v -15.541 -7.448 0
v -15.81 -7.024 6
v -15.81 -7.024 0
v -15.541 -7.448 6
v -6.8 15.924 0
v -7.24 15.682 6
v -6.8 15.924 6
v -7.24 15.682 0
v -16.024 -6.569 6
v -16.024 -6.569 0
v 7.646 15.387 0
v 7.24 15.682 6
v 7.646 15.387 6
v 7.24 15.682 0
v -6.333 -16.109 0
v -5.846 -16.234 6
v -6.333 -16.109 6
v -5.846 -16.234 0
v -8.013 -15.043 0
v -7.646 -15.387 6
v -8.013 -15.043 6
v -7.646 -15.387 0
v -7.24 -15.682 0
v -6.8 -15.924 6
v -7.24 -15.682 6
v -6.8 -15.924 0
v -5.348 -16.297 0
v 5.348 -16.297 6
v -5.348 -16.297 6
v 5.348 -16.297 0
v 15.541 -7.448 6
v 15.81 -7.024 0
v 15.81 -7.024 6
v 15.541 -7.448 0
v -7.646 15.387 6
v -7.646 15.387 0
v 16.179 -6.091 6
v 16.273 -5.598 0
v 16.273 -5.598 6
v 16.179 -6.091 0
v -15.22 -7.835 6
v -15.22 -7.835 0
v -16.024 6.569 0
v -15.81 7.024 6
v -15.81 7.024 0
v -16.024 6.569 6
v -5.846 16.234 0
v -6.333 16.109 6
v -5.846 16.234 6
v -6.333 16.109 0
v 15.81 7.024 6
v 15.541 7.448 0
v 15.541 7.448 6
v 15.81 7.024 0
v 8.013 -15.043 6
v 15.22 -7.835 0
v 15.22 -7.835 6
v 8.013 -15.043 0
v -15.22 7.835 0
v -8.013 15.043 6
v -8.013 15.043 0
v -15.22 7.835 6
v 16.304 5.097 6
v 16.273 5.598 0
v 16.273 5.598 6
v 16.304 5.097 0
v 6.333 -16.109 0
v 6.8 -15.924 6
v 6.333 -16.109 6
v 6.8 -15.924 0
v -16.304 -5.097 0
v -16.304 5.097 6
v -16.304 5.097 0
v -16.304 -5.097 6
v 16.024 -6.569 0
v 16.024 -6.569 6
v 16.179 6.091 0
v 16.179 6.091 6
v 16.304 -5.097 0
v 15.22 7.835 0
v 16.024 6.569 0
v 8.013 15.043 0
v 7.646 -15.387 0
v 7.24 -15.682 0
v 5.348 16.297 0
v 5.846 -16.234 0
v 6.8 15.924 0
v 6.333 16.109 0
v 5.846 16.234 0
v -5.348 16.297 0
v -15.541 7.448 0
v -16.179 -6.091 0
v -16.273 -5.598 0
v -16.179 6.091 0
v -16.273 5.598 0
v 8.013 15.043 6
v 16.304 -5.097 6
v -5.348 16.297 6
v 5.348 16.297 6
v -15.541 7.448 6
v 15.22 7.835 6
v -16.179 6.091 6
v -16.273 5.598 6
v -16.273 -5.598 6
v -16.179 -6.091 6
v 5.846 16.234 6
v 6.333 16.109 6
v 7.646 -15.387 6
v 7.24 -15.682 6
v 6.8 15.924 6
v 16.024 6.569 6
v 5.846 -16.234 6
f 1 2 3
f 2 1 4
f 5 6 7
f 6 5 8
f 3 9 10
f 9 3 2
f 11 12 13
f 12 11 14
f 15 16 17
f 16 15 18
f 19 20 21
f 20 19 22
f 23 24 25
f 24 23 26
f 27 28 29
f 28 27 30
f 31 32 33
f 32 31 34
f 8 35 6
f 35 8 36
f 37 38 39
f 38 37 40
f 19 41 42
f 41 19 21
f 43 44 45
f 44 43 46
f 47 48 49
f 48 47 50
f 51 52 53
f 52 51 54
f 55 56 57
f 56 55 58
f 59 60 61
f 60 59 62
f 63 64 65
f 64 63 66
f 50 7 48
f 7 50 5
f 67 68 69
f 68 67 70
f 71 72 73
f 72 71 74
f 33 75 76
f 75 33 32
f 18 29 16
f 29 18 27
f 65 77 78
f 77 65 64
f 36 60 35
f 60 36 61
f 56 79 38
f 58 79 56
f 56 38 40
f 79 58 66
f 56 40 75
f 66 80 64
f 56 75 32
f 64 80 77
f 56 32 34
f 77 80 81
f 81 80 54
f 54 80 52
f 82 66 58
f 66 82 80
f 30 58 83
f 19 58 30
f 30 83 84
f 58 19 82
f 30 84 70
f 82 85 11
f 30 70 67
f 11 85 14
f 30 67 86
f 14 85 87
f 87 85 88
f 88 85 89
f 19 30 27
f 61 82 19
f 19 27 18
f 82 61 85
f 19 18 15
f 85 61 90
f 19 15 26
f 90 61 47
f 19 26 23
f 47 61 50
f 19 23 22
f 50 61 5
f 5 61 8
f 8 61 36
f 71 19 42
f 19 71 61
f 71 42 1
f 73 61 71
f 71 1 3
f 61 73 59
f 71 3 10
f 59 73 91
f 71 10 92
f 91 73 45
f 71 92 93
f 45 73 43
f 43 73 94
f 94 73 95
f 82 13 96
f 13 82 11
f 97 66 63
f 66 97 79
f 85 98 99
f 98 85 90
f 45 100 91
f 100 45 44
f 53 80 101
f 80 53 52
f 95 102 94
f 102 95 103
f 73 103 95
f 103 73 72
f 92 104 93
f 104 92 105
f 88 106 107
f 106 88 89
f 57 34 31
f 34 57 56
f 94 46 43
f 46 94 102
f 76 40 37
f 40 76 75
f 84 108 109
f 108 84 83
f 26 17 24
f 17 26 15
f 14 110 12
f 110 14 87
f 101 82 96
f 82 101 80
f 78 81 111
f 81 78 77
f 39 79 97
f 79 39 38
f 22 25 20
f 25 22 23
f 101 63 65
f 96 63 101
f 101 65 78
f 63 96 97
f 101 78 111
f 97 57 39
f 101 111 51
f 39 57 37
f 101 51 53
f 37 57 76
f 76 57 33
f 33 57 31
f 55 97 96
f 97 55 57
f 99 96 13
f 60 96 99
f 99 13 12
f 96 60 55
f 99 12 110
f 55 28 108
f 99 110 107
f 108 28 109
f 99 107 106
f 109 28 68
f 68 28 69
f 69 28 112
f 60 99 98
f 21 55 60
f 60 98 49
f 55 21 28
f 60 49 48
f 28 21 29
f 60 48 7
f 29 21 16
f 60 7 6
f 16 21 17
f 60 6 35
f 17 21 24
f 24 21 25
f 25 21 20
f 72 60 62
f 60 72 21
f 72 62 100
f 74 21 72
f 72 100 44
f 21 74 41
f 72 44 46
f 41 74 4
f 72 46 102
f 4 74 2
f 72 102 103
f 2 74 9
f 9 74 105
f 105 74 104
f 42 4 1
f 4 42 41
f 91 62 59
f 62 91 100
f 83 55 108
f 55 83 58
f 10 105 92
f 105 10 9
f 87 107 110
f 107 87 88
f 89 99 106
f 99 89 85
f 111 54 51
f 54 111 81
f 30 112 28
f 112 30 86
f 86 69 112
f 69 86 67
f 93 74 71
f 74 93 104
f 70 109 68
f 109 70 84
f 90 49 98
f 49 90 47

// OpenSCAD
$fn = 50;

difference() {
	union() {
		hull() {
			translate(v = [12.304473773860758, 5.096679914997186, 0]) {
				cylinder(h = 6, r = 4);
			}
			translate(v = [5.096679914997186, 12.304473773860758, 0]) {
				cylinder(h = 6, r = 4);
			}
			translate(v = [-5.0966799149971855, 12.304473773860758, 0]) {
				cylinder(h = 6, r = 4);
			}
			translate(v = [-12.304473773860758, 5.096679914997187, 0]) {
				cylinder(h = 6, r = 4);
			}
			translate(v = [-12.30447377386076, -5.096679914997185, 0]) {
				cylinder(h = 6, r = 4);
			}
			translate(v = [-5.096679914997182, -12.30447377386076, 0]) {
				cylinder(h = 6, r = 4);
			}
			translate(v = [5.096679914997189, -12.304473773860758, 0]) {
				cylinder(h = 6, r = 4);
			}
			translate(v = [12.30447377386076, -5.096679914997183, 0]) {
				cylinder(h = 6, r = 4);
			}
		}
	}
	union();
}
